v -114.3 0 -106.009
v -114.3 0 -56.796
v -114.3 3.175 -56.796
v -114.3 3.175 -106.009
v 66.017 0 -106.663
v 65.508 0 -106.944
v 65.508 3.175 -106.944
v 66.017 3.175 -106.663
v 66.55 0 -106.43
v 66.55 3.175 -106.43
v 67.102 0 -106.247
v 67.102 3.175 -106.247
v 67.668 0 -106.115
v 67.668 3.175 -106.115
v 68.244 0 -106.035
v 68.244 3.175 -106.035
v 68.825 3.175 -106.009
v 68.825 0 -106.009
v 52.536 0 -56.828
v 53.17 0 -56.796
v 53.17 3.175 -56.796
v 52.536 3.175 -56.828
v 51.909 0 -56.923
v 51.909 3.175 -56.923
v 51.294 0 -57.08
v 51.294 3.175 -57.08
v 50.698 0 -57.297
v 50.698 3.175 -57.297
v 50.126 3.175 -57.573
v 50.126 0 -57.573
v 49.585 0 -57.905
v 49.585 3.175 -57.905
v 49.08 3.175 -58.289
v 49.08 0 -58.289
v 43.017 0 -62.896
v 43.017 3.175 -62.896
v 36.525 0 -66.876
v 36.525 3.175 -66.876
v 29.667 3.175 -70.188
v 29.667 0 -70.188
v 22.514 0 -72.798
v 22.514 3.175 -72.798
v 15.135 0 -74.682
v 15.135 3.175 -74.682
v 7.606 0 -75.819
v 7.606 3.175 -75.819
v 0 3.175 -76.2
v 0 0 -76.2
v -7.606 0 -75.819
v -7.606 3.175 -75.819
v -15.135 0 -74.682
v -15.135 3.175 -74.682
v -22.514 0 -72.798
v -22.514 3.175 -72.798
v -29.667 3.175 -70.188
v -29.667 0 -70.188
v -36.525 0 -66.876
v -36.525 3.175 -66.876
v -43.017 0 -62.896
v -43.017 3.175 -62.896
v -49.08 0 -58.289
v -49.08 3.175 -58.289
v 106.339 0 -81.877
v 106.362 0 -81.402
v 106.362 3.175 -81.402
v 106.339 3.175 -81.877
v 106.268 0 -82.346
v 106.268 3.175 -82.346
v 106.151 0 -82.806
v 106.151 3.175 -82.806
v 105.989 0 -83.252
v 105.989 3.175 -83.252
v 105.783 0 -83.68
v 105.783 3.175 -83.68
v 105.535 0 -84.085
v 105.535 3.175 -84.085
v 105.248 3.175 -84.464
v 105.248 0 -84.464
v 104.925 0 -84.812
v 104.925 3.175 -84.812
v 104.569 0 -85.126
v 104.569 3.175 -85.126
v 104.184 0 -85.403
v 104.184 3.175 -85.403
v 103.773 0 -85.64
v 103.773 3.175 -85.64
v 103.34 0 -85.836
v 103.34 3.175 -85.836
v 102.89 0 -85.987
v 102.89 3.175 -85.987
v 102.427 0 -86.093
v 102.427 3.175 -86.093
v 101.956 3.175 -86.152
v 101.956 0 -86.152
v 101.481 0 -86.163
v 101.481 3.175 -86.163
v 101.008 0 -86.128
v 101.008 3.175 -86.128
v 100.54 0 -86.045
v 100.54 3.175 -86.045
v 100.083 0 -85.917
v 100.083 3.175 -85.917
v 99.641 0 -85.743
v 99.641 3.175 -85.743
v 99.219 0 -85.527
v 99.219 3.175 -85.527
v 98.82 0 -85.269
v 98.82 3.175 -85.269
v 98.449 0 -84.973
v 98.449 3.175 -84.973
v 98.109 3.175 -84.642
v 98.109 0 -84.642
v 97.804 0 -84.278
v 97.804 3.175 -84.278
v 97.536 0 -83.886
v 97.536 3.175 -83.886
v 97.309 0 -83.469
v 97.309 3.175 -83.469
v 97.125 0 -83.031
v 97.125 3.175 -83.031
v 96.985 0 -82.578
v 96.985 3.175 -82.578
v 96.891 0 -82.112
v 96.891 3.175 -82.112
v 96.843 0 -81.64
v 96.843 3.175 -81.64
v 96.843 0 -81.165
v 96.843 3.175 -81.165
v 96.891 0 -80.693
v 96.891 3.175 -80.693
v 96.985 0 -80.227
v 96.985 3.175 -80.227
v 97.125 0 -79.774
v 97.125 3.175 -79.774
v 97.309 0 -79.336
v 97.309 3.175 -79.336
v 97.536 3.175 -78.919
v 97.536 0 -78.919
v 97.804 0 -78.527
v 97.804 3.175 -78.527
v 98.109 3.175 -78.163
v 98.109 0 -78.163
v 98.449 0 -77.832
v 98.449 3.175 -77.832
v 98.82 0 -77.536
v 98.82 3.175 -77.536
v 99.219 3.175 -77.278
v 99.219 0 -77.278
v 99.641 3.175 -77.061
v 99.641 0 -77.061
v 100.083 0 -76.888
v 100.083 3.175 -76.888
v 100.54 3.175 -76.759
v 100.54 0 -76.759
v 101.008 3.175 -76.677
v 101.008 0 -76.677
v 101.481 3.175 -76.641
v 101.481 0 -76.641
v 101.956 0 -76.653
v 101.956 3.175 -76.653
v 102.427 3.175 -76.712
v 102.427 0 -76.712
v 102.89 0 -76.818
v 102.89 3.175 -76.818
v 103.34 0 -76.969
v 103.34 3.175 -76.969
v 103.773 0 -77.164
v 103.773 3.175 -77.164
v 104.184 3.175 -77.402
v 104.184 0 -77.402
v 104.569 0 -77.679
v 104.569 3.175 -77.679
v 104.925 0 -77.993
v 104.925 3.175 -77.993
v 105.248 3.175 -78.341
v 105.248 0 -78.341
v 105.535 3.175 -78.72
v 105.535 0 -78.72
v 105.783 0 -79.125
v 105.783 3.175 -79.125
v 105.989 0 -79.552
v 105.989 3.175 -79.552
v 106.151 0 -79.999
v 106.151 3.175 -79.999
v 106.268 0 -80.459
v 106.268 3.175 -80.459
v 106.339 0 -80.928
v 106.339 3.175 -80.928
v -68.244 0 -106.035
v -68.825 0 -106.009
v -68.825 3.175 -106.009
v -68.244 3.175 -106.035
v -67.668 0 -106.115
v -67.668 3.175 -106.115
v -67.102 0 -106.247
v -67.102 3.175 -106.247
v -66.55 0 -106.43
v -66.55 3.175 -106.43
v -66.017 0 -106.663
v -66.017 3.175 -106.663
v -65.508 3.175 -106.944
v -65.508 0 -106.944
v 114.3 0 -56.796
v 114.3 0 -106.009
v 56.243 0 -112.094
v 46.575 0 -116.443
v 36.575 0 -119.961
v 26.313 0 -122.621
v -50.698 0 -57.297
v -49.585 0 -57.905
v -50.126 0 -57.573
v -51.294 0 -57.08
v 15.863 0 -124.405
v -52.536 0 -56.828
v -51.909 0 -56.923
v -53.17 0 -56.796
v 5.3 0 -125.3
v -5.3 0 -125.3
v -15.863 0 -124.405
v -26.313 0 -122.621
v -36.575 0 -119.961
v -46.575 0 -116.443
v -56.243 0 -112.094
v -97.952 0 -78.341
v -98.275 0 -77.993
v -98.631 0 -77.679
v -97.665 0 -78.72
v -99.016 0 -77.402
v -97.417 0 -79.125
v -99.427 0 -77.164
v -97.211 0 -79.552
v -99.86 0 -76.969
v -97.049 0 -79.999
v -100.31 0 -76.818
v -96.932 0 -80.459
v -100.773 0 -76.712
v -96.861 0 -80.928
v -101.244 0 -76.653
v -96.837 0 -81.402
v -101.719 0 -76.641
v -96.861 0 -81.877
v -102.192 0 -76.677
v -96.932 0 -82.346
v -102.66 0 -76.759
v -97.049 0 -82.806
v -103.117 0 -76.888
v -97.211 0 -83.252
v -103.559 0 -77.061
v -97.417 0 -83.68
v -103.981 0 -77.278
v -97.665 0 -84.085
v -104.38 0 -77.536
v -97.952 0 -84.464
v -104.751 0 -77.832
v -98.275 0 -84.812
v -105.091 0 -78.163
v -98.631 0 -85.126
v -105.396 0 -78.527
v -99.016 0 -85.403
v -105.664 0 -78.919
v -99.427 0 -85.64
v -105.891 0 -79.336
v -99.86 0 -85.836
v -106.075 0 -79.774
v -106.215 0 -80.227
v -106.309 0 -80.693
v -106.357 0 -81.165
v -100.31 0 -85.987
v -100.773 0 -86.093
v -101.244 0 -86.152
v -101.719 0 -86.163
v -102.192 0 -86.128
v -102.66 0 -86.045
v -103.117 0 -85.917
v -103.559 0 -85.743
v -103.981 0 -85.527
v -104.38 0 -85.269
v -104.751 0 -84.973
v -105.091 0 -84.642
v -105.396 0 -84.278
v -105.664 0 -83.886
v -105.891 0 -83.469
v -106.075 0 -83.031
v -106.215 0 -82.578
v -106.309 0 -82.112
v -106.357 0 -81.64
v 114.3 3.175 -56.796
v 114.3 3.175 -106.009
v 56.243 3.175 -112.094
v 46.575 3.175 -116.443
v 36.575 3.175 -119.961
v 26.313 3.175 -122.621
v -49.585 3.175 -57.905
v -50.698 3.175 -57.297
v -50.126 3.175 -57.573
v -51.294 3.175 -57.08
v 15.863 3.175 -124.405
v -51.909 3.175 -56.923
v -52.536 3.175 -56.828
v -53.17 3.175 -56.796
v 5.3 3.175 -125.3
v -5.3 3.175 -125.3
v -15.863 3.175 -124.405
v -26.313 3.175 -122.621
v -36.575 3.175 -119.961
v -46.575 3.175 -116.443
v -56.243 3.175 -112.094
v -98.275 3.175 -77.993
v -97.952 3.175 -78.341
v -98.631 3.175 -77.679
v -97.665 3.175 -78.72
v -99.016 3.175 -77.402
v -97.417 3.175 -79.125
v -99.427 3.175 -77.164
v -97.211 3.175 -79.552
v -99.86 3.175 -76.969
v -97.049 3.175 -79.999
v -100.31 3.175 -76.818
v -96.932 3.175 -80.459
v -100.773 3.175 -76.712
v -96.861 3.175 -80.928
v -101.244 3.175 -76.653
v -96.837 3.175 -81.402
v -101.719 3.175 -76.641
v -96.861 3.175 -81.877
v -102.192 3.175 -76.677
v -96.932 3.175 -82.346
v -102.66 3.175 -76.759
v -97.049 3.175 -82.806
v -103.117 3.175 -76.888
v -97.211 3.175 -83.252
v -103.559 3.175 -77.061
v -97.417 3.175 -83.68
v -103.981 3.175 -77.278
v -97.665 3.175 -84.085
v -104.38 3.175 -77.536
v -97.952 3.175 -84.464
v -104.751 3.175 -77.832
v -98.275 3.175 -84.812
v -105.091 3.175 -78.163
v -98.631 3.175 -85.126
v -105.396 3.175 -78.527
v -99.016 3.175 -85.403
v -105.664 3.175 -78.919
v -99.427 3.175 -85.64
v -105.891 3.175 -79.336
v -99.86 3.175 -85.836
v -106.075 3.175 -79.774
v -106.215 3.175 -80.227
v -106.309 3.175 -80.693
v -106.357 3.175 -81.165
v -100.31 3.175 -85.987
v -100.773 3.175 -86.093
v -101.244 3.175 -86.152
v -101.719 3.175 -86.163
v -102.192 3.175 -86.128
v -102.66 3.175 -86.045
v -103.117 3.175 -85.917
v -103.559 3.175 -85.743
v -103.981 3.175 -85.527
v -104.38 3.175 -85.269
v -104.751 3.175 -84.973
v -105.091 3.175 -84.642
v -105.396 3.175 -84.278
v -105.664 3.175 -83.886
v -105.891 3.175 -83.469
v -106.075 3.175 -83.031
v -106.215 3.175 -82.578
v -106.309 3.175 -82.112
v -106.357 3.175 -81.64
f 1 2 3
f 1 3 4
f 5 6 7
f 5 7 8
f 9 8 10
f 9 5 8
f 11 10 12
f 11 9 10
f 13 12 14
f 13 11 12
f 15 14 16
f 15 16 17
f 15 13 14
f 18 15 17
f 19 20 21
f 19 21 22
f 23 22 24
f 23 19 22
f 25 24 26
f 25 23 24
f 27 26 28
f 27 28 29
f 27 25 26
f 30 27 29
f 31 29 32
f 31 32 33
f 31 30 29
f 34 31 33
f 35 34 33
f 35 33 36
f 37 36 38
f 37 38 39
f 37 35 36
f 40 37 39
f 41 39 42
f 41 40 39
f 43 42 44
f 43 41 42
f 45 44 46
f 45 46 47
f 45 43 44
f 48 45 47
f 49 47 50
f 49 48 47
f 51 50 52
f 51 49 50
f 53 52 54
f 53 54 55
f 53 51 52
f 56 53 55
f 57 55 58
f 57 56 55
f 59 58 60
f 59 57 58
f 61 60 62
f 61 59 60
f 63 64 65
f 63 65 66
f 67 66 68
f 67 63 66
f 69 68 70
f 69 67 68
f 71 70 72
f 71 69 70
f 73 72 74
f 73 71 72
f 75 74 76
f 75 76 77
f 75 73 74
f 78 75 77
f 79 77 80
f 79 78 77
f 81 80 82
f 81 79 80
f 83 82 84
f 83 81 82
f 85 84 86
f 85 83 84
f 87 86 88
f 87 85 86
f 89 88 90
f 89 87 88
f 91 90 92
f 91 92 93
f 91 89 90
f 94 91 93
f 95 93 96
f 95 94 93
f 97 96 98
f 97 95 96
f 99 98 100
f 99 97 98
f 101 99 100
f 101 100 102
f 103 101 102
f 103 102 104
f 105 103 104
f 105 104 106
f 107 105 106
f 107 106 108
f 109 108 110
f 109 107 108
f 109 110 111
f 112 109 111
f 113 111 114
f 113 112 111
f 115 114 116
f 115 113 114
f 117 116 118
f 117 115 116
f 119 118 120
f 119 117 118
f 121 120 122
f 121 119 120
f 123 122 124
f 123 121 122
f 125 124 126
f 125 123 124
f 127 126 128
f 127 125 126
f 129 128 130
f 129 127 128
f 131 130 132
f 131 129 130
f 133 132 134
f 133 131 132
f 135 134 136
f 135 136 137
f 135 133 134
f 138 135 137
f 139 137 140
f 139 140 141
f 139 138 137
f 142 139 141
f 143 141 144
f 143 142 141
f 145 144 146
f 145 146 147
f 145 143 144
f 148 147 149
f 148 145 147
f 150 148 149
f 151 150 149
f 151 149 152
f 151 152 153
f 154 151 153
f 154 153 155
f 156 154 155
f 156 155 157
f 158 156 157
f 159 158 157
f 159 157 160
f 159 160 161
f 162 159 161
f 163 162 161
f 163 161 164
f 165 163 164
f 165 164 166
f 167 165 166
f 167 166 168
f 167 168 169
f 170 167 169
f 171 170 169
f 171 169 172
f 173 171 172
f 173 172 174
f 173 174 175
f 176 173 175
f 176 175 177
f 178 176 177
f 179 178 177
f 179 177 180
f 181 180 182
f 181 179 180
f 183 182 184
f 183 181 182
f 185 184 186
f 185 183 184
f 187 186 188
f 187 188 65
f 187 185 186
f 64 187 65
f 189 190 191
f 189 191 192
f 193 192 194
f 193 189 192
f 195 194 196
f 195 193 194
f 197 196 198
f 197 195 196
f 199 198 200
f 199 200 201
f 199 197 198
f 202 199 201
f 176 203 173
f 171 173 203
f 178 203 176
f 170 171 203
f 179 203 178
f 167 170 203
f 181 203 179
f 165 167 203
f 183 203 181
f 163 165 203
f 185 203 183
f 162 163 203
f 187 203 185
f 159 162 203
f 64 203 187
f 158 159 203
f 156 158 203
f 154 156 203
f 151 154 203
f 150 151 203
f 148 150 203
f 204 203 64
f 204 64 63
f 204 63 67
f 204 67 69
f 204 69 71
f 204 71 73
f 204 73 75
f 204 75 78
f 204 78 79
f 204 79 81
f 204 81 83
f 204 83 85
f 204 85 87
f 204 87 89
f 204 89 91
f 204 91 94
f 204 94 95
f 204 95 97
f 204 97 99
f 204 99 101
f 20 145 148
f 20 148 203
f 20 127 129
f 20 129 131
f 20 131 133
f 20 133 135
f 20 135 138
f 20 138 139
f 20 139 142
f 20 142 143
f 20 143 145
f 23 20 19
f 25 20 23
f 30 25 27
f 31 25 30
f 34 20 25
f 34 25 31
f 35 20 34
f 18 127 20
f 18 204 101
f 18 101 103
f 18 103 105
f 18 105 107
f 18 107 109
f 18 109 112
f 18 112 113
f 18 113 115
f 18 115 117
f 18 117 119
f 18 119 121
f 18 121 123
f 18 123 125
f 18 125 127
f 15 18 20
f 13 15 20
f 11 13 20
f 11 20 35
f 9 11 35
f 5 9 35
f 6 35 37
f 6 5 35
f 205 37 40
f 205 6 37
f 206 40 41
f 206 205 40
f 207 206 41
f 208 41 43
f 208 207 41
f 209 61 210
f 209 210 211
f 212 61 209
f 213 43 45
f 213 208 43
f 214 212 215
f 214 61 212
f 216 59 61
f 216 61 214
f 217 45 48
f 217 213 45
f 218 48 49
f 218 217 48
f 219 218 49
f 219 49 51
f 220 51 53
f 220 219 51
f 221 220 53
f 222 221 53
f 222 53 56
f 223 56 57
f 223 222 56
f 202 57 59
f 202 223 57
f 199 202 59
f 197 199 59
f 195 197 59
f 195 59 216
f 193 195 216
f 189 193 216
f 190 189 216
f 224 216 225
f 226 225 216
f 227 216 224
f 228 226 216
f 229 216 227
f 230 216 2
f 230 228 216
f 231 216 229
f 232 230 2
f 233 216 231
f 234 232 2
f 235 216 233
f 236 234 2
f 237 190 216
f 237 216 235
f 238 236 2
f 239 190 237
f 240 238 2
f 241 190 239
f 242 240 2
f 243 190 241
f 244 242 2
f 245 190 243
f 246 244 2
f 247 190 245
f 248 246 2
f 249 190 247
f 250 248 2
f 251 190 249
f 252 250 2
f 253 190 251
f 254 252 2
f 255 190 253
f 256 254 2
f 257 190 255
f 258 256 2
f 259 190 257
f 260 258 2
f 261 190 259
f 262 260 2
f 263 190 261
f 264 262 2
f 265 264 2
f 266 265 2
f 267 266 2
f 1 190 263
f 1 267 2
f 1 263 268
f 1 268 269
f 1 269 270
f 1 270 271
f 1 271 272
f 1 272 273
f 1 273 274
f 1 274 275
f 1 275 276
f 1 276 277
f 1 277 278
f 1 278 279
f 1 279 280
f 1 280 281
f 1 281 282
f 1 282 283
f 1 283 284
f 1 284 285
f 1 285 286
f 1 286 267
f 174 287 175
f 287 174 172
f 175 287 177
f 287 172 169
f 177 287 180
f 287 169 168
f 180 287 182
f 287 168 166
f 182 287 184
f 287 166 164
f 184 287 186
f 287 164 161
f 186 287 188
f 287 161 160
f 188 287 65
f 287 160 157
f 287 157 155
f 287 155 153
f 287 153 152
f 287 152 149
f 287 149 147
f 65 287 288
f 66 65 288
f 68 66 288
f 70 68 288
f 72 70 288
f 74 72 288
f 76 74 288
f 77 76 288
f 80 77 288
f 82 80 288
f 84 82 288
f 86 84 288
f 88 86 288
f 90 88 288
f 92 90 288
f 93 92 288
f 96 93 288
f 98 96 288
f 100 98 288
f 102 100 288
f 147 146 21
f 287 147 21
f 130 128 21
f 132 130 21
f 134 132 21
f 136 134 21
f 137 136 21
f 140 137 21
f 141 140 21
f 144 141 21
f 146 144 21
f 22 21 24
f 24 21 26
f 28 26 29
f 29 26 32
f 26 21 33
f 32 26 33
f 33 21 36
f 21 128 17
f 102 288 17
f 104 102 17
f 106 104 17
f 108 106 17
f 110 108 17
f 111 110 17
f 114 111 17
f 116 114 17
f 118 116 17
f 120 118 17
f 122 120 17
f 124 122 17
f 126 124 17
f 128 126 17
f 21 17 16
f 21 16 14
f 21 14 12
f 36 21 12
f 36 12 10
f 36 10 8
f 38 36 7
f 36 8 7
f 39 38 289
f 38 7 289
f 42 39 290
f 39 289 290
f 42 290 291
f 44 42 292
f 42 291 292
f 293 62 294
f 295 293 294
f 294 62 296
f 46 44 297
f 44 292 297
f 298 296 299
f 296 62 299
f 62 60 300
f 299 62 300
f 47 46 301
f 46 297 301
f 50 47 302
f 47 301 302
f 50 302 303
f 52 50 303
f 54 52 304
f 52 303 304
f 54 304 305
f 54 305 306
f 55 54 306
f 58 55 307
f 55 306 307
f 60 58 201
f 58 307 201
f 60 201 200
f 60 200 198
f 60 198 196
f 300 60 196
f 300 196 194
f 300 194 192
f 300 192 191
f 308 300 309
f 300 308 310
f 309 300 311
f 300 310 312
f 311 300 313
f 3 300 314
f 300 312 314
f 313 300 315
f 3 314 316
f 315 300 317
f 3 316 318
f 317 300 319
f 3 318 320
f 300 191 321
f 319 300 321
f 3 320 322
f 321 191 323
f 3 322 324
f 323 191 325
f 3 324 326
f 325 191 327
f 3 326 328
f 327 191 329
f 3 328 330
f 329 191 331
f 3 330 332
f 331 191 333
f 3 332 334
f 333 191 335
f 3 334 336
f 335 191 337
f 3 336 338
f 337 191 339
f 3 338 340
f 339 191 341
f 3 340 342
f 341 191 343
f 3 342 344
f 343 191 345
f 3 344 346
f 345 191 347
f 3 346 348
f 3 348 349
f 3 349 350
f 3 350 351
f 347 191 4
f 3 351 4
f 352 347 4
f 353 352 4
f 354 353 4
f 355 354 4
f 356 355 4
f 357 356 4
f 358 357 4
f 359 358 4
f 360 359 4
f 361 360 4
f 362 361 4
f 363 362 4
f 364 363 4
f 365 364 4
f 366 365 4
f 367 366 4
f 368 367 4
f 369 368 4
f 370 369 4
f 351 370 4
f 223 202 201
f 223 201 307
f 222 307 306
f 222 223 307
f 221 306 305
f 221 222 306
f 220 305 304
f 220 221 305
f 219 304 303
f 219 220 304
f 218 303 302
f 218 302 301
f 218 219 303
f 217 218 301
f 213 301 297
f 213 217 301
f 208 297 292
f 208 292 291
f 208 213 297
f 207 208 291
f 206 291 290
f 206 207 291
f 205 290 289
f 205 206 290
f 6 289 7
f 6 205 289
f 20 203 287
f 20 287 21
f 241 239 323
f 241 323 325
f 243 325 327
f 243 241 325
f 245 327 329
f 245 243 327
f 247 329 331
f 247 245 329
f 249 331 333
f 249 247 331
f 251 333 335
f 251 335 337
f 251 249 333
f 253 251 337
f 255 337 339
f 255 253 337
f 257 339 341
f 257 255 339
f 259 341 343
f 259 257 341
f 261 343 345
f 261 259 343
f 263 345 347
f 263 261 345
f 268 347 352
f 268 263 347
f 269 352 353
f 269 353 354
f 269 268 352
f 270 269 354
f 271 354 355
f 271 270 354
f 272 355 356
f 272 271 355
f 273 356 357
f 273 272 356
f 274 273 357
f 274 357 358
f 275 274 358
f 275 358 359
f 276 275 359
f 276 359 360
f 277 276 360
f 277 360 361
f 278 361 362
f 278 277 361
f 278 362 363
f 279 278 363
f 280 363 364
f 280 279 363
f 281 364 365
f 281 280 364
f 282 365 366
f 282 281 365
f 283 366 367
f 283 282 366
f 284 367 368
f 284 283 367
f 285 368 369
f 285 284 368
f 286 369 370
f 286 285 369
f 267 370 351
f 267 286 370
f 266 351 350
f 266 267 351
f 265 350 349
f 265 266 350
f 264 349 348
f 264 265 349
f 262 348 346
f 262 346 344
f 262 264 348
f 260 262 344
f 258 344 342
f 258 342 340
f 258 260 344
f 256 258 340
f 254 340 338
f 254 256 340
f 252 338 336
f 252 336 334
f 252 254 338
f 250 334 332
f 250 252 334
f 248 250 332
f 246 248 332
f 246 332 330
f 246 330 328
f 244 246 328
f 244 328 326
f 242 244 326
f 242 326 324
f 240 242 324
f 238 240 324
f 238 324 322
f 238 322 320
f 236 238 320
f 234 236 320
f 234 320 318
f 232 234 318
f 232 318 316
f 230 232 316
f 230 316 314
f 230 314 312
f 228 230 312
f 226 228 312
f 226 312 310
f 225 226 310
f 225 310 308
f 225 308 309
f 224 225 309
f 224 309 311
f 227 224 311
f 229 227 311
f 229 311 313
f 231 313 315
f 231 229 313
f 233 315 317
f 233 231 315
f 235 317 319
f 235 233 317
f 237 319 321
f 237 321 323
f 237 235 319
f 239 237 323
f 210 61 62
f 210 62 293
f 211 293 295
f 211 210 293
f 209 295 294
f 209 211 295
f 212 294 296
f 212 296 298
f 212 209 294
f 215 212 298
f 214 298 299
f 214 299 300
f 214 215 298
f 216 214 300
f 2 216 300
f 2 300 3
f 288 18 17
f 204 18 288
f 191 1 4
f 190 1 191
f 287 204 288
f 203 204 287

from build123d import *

# Parameters (mm, degrees)
SKETCH1_R      = 4.7625
EXTRUDE1_DEPTH = 3.175


with BuildPart() as part:
    # Sketch1 → Extrude1 (new body)
    with BuildSketch(Plane(origin=(0, 0, 0), x_dir=(1, 0, 0), z_dir=(0, 1, 0))):
        with BuildLine():
            Line((-53.17019082, 56.796126628), (-114.3, 56.796126628))
            Line((-114.3, 56.796126628), (-114.3, 106.008626628))
            Line((-114.3, 106.008626628), (-68.825107544, 106.008626628))
            ThreePointArc((-68.825107544, 106.008626628), (-67.102021241, 106.246877812), (-65.508234891, 106.943753056))
            ThreePointArc((-65.508234891, 106.943753056), (0, 125.4125), (65.508234891, 106.943753056))
            ThreePointArc((65.508234891, 106.943753056), (67.102021241, 106.246877812), (68.825107544, 106.008626628))
            Line((68.825107544, 106.008626628), (114.3, 106.008626628))
            Line((114.3, 106.008626628), (114.3, 56.796126628))
            Line((114.3, 56.796126628), (53.17019082, 56.796126628))
            ThreePointArc((53.17019082, 56.796126628), (50.99326112, 57.180937857), (49.080176141, 58.288732272))
            ThreePointArc((49.080176141, 58.288732272), (0, 76.2), (-49.080176141, 58.288732272))
            ThreePointArc((-49.080176141, 58.288732272), (-50.99326112, 57.180937857), (-53.17019082, 56.796126628))
        make_face()
        with Locations((101.6, 81.402376628)):
            Circle(SKETCH1_R, mode=Mode.SUBTRACT)
        with Locations((-101.6, 81.402376628)):
            Circle(SKETCH1_R, mode=Mode.SUBTRACT)
    extrude(amount=EXTRUDE1_DEPTH)


solid = part.part
